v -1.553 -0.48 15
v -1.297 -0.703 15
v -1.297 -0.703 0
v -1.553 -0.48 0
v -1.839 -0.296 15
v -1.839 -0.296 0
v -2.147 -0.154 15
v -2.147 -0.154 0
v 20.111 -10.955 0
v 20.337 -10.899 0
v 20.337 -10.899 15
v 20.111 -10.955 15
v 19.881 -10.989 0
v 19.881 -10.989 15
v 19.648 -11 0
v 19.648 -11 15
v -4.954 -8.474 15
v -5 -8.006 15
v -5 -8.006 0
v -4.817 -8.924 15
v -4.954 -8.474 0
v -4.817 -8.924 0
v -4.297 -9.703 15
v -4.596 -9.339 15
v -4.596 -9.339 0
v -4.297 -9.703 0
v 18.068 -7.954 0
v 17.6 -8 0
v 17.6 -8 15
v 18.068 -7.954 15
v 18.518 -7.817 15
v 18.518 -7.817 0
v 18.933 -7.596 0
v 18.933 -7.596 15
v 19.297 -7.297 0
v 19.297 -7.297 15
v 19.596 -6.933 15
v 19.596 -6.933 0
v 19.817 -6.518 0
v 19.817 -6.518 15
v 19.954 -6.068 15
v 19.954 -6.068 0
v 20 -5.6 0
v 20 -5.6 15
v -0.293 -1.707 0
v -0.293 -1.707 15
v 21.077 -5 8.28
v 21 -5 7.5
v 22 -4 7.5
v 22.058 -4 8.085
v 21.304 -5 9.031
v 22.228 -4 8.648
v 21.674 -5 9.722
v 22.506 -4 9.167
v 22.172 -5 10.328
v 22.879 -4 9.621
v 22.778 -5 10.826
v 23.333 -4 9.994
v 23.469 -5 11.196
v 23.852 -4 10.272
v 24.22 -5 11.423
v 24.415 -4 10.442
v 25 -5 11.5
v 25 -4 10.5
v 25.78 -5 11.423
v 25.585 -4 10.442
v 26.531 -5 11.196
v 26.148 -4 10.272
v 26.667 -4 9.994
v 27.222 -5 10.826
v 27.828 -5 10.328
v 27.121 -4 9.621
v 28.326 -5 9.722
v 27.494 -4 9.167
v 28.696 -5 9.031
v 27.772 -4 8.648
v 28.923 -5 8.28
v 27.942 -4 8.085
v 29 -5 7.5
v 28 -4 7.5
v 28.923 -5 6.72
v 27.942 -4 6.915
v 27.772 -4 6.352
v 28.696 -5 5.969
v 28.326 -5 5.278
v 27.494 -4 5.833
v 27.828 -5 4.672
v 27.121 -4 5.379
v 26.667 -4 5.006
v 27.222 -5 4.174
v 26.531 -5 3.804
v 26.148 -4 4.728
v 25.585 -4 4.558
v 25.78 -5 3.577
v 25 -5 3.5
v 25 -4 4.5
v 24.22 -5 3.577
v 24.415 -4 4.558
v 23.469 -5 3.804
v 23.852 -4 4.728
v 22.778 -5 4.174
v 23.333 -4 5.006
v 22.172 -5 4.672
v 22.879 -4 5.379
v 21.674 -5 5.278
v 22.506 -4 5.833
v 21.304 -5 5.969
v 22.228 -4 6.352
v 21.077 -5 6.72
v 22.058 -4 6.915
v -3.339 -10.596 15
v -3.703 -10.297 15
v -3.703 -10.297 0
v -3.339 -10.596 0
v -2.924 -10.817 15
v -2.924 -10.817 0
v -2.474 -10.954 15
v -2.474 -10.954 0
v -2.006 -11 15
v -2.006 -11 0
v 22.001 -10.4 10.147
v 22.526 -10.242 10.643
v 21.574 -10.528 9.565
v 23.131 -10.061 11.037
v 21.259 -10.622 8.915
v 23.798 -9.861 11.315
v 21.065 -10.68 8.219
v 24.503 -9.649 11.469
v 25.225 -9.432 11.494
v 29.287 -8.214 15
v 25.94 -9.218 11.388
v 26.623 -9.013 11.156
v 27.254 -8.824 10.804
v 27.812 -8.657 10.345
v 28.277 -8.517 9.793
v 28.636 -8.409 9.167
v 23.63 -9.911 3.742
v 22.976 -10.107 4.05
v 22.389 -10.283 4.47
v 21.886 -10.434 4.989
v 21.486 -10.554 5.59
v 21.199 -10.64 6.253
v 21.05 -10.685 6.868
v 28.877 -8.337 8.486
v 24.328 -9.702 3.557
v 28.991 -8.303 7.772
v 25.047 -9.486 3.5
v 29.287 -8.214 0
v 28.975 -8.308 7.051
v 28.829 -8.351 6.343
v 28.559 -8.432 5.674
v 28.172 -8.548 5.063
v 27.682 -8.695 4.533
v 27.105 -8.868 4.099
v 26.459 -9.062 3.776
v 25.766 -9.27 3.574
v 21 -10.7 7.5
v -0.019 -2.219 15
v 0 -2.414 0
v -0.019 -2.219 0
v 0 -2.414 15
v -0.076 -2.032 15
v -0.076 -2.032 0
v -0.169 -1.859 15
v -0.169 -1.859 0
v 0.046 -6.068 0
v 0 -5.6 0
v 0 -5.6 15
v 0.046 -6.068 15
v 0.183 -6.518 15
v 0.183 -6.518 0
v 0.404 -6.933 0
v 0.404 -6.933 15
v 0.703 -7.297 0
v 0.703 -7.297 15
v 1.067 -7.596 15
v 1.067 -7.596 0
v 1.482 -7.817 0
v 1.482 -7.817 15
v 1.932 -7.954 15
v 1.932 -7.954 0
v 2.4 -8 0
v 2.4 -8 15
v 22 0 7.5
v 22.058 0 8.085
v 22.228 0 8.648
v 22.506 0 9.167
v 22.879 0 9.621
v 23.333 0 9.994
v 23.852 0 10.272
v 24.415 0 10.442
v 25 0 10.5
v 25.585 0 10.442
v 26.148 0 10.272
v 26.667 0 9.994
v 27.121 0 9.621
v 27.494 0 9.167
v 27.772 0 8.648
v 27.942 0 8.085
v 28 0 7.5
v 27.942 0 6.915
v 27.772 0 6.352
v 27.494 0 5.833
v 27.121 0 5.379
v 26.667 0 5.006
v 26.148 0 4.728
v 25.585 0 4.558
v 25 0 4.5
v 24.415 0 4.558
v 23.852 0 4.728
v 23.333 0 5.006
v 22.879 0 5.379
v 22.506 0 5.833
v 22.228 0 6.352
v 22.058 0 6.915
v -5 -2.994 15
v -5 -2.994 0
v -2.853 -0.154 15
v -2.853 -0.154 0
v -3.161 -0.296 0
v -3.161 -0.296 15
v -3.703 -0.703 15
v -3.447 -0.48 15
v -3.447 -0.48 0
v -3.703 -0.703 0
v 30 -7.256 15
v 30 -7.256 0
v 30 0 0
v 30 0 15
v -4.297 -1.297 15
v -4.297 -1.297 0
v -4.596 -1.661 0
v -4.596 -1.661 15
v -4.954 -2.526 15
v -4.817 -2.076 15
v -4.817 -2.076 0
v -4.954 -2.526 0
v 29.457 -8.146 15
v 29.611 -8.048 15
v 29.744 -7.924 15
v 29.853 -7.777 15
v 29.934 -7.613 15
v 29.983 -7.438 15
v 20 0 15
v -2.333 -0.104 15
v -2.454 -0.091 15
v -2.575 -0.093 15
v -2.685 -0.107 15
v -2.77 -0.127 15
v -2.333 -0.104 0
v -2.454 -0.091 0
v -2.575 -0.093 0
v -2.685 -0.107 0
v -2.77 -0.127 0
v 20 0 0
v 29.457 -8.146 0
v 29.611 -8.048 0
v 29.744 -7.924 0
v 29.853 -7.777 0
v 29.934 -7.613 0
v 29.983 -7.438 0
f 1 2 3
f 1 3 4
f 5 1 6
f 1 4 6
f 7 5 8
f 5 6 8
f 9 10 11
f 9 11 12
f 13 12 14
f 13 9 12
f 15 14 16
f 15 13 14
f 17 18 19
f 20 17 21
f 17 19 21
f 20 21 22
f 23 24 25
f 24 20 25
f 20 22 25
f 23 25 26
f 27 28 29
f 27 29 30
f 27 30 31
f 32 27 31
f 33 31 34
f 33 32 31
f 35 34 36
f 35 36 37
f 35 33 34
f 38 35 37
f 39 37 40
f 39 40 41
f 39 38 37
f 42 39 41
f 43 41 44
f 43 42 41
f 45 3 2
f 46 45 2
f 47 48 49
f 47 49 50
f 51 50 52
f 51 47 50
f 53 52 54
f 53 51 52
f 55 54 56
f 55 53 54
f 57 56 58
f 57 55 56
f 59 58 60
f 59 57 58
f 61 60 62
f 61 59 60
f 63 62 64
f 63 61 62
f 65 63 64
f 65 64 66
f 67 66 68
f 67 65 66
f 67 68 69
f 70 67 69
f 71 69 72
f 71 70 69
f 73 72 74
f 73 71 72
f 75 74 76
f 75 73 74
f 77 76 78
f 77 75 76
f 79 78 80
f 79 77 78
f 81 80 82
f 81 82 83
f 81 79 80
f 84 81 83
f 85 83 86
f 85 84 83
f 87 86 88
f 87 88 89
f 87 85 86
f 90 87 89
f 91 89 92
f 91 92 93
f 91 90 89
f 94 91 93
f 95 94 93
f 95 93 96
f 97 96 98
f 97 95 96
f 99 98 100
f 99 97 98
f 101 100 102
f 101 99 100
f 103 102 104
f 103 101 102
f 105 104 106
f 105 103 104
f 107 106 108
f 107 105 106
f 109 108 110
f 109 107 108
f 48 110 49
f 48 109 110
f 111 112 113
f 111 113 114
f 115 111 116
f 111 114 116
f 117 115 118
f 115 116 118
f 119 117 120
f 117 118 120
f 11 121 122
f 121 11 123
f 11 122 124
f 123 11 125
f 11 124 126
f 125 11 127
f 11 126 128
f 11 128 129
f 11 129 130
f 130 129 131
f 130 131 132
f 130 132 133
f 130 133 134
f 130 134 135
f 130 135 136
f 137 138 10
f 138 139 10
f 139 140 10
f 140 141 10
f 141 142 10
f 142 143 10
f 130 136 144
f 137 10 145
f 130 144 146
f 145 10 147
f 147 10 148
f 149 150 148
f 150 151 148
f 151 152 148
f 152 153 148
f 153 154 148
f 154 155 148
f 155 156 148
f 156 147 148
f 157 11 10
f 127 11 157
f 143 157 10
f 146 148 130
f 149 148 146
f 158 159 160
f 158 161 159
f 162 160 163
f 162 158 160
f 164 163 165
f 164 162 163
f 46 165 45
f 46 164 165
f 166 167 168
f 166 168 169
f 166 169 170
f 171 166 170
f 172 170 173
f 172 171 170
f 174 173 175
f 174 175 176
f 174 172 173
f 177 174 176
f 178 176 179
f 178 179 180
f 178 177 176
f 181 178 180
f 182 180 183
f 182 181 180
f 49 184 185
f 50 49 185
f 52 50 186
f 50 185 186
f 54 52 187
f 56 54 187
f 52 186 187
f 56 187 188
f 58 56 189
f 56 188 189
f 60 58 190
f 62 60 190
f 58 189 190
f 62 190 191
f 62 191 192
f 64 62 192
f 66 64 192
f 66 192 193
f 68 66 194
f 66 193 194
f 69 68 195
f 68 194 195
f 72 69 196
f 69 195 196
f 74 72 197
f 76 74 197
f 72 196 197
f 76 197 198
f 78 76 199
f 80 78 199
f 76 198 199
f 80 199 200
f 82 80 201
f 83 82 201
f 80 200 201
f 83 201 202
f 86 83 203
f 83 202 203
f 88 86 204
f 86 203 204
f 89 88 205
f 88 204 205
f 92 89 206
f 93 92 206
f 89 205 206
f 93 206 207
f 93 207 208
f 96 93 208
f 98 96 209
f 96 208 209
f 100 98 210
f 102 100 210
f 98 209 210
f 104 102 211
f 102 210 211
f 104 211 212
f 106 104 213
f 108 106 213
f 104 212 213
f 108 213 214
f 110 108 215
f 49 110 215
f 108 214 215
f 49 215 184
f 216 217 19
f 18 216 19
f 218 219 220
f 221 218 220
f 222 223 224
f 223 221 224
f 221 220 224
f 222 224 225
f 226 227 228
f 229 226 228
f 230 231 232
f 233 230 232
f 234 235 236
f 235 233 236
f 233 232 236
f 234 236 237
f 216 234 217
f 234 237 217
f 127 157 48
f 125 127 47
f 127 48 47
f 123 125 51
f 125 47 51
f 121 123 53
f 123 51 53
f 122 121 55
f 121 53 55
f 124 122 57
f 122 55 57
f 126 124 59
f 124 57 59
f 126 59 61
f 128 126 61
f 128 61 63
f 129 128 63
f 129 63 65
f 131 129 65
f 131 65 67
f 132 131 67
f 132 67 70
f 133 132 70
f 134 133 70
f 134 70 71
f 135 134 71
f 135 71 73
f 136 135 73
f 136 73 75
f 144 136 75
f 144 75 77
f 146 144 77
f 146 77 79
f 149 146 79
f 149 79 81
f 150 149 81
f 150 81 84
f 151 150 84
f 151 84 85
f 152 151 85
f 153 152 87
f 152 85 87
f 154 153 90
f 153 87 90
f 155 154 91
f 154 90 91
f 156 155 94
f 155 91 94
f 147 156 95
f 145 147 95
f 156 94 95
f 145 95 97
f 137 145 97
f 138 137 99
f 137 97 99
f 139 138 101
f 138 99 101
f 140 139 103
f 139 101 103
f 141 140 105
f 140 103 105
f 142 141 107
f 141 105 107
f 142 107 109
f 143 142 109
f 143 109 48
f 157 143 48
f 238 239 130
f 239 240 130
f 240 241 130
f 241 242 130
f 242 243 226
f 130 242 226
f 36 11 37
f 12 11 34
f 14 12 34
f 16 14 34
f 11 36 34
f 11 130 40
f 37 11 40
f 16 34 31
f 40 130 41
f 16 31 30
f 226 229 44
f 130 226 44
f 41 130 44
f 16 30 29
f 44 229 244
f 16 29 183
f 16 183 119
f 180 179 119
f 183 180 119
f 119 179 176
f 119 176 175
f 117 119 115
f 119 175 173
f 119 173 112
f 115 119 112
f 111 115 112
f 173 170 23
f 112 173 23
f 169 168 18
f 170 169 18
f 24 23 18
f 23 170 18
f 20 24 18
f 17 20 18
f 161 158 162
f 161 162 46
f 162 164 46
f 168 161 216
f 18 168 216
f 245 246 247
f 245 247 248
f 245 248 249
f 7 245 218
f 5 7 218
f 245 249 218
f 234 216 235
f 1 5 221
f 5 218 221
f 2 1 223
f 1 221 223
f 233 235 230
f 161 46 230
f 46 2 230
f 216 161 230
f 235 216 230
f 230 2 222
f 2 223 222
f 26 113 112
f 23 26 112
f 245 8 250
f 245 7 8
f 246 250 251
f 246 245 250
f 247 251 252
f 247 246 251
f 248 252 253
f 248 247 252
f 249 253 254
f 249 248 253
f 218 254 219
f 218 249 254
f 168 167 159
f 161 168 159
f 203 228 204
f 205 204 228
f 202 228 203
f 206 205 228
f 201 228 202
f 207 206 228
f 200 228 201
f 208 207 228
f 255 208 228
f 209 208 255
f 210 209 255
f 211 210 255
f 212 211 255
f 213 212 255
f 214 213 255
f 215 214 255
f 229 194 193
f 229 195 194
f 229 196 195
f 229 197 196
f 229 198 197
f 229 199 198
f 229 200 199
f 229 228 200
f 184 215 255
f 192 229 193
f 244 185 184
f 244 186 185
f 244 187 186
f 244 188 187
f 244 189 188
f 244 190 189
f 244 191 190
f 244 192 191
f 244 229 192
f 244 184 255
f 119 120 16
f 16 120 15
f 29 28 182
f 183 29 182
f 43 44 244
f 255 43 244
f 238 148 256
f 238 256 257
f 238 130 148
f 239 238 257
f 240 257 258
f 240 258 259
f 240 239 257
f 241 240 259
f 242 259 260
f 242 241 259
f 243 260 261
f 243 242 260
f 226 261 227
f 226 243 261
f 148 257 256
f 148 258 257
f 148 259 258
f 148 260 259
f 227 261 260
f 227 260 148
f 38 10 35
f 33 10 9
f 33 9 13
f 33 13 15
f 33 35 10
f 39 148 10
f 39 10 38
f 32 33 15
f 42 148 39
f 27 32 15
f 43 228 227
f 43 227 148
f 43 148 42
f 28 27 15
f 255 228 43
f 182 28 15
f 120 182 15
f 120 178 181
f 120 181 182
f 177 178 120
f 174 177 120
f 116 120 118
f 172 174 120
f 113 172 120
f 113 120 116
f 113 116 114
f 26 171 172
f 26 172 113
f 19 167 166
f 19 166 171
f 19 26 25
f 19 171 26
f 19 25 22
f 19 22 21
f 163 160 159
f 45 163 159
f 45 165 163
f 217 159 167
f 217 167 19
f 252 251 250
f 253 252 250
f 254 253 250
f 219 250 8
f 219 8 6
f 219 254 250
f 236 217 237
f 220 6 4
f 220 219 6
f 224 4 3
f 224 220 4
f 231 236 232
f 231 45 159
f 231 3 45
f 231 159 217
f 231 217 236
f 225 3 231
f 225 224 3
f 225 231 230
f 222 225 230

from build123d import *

# Parameters (mm, degrees)
F0_W        = 10
F0_H        = 8
F1_DEPTH    = 15
F2_R        = 4
F2_R_2      = 3
F3_DEPTH    = 25
F4_DEPTH    = 5
F5_SIZE     = 0.99999
F6_SIZE     = 2
F7_T1_DEPTH = 15
F7_T3_DEPTH = 19.9705627485
F7_T5_DEPTH = 16.7612260356
F8_R        = 1


# Not quite as in the source:
# - a fillet or chamfer that OpenCascade refuses, or shapes differently, is made with other operations: its cross-section is extruded or revolved along the edge and cut away or added
# - a fillet or chamfer is up to 0.001 mm smaller than in the source, because OpenCascade refuses the exact size


with BuildPart() as f1:
    # F0 (on Top) → F1 (new body)
    with BuildSketch(Plane.XY):
        Polygon((20, -8), (0, -8), (0, 0), (-5, 0), (-5, -11), (20, -11), align=None)
        with Locations((25, -4)):
            Rectangle(F0_W, F0_H)
        Polygon((30, -8), (20, -8), (20, -11), align=None)
    extrude(amount=F1_DEPTH)

    # F2 (on face) → F3 (cut)
    with BuildSketch(Plane(origin=(0, 0, 0), x_dir=(-1, 0, 0), z_dir=(0, 1, 0))):
        with Locations((-25, 7.5)):
            Circle(F2_R)
        with Locations((-25, 7.5)):
            Circle(F2_R_2, mode=Mode.SUBTRACT)
        with Locations((-25, 7.5)):
            Circle(F2_R_2)
    extrude(amount=-F3_DEPTH, mode=Mode.SUBTRACT)

    # F2 (on face) → F4 (join)
    with BuildSketch(Plane(origin=(0, 0, 0), x_dir=(-1, 0, 0), z_dir=(0, 1, 0))):
        with Locations((-25, 7.5)):
            Circle(F2_R)
        with Locations((-25, 7.5)):
            Circle(F2_R_2, mode=Mode.SUBTRACT)
    extrude(amount=-F4_DEPTH)

    # F5 (size 1 in the source; OpenCascade refuses exactly that, so slightly less here)
    f5_edges = [f1.edges().sort_by_distance(p)[0] for p in [
        (28, -5, 7.5),
    ]]
    chamfer(f5_edges, length=F5_SIZE)

    # F6
    f6_edges = [f1.edges().sort_by_distance(p)[0] for p in [
        (-5, 0, 7.5),
        (0, 0, 7.5),
        (-5, -11, 7.5),
    ]]
    chamfer(f6_edges, length=F6_SIZE)

    # F7: fillet of radius 2.4 on 8 edges, made by hand

    # F7_s2 → F7_t1 (join)
    with BuildSketch(Plane.XY):
        with BuildLine():
            ThreePointArc((0, -5.6), (0.7029437252, -7.2970562748), (2.4, -8))
            Line((2.4, -8), (0, -8))
            Line((0, -8), (0, -5.6))
        make_face()
        with BuildLine():
            ThreePointArc((17.6, -8), (19.2970562748, -7.2970562748), (20, -5.6))
            Line((20, -5.6), (20, -8))
            Line((20, -8), (17.6, -8))
        make_face()
    extrude(amount=F7_T1_DEPTH)

    # F7_s4 → F7_t3 (cut)
    with BuildSketch(Plane.XY.offset(-2.4852813742)):
        with BuildLine():
            ThreePointArc((-1.2970562748, -0.7029437252), (-2.075672312, -0.182689122), (-2.9941125497, 0))
            Line((-2.9941125497, 0), (-2, 0))
            Line((-2, 0), (-1.2970562748, -0.7029437252))
        make_face()
        with BuildLine():
            ThreePointArc((-2.0058874503, 0), (-2.924327688, -0.182689122), (-3.7029437252, -0.7029437252))
            Line((-3.7029437252, -0.7029437252), (-3, 0))
            Line((-3, 0), (-2.0058874503, 0))
        make_face()
        with BuildLine():
            ThreePointArc((-4.2970562748, -1.2970562748), (-4.817310878, -2.075672312), (-5, -2.9941125497))
            Line((-5, -2.9941125497), (-5, -2))
            Line((-5, -2), (-4.2970562748, -1.2970562748))
        make_face()
        with BuildLine():
            ThreePointArc((-5, -8.0058874503), (-4.817310878, -8.924327688), (-4.2970562748, -9.7029437252))
            Line((-4.2970562748, -9.7029437252), (-5, -9))
            Line((-5, -9), (-5, -8.0058874503))
        make_face()
        with BuildLine():
            ThreePointArc((-3.7029437252, -10.2970562748), (-2.924327688, -10.817310878), (-2.0058874503, -11))
            Line((-2.0058874503, -11), (-3, -11))
            Line((-3, -11), (-3.7029437252, -10.2970562748))
        make_face()
    extrude(amount=F7_T3_DEPTH, mode=Mode.SUBTRACT)

    # F7_s6 → F7_t5 (cut)
    with BuildSketch(Plane.XY.offset(-0.8806130178)):
        with BuildLine():
            ThreePointArc((20.3373897182, -10.8987830845), (19.9962663401, -10.9745609492), (19.6477547929, -11))
            Line((19.6477547929, -11), (20, -11))
            Line((20, -11), (20.3373897182, -10.8987830845))
        make_face()
    extrude(amount=F7_T5_DEPTH, mode=Mode.SUBTRACT)

    # F8
    f8_edges = [f1.edges().sort_by_distance(p)[0] for p in [
        (-2.5, -0.051415, 7.5),
        (0, -2, 7.5),
        (30, -8, 7.5),
    ]]
    fillet(f8_edges, radius=F8_R)


solid = f1.part
